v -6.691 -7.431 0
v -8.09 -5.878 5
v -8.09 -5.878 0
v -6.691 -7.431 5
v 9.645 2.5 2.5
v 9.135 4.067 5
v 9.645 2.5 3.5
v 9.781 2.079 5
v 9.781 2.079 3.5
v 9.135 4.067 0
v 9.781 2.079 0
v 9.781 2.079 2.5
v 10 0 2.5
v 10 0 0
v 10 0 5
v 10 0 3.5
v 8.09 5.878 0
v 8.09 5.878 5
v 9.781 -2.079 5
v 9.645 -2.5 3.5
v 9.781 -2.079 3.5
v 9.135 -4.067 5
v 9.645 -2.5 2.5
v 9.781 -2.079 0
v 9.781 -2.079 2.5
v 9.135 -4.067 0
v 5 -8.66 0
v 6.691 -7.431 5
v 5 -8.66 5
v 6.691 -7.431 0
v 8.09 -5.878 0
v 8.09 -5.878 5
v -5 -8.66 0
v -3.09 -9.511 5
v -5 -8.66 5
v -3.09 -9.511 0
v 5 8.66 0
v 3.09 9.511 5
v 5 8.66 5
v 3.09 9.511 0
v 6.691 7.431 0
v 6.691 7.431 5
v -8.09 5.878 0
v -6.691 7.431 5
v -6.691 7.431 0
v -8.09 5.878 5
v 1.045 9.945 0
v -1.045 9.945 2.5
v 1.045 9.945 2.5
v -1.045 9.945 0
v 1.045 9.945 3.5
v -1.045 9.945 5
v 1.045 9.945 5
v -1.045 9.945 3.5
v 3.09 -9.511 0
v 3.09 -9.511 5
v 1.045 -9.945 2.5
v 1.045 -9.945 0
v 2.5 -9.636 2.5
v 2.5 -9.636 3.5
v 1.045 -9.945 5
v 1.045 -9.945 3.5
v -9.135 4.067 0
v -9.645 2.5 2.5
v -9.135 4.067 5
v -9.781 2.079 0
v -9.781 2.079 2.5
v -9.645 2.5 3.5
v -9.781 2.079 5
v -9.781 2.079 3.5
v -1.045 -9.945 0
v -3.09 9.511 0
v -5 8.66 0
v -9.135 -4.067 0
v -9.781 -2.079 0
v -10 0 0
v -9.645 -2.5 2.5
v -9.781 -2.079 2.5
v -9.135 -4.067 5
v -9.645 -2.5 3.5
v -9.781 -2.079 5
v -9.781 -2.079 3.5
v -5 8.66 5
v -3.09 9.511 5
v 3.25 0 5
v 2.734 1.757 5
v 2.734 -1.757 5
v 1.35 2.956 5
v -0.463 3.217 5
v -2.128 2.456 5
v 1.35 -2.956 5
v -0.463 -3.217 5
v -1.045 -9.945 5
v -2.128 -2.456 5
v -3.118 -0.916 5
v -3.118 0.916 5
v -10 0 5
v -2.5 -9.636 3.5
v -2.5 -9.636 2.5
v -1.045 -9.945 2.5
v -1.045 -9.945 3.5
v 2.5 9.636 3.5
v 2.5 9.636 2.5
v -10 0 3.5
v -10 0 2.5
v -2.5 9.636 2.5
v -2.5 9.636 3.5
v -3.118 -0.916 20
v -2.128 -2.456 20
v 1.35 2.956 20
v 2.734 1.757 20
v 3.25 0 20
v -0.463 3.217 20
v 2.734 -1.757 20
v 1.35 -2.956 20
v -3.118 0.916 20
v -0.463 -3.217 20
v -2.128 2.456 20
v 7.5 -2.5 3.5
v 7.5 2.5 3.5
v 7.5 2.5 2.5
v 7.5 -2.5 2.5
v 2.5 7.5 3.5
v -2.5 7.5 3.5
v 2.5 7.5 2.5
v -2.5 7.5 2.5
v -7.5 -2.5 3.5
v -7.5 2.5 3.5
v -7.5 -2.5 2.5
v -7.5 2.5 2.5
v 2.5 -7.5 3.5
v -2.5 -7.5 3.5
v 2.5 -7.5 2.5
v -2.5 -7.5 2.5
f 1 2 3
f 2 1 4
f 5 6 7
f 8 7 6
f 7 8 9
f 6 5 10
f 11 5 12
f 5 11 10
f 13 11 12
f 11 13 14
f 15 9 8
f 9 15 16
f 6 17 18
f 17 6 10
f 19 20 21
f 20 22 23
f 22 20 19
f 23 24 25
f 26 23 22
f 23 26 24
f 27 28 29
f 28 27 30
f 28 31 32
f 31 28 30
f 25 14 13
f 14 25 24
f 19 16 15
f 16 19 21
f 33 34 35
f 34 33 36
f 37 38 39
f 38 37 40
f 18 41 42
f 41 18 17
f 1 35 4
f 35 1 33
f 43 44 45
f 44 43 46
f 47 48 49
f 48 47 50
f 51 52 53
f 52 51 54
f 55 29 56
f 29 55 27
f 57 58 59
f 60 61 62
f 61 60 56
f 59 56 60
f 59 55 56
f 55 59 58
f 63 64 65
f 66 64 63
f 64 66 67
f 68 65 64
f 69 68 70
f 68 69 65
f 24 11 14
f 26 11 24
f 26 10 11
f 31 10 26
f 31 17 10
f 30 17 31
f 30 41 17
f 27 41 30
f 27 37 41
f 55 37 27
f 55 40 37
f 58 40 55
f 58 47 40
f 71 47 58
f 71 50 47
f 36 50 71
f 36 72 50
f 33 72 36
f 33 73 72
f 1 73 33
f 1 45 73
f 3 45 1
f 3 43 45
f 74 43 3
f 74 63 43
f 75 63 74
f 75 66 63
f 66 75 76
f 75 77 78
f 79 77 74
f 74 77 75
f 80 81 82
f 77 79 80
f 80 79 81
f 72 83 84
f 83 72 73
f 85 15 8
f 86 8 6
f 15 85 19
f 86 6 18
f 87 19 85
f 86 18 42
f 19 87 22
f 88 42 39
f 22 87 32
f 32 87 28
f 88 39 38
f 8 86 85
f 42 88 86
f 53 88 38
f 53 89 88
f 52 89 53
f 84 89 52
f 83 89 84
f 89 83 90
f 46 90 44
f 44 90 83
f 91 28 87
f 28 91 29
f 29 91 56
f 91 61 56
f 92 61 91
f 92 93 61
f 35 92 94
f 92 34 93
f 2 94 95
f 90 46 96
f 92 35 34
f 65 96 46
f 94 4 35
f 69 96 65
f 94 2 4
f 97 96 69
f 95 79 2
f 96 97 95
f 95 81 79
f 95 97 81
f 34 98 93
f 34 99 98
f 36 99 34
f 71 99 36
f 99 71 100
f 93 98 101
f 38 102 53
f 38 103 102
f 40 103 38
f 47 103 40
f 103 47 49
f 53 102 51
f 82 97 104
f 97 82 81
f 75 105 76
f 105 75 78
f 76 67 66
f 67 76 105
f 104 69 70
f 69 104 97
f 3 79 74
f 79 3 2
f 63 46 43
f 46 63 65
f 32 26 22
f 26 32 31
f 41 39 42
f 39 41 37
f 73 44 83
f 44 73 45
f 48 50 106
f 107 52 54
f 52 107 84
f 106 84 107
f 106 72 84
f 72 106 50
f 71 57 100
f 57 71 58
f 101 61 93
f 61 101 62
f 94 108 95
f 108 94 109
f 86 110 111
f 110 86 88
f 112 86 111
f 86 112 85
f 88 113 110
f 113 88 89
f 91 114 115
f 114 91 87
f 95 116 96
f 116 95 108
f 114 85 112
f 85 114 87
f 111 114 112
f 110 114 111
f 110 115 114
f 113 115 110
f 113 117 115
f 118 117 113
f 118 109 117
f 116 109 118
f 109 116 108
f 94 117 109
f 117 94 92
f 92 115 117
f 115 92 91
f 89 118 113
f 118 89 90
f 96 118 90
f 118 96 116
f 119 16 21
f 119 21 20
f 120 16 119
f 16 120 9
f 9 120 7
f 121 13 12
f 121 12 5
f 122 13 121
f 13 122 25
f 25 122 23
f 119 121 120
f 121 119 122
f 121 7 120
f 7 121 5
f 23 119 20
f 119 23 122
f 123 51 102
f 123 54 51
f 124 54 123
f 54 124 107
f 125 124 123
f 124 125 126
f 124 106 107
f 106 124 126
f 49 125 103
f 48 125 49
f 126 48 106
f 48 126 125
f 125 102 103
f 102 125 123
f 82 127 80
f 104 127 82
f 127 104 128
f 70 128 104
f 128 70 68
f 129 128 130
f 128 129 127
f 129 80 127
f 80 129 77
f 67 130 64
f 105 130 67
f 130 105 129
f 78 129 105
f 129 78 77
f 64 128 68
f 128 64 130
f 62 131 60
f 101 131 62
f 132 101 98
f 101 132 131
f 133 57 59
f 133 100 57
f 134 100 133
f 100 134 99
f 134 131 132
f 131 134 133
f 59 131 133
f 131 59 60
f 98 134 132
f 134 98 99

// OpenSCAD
difference() {
    union() {
        cylinder(d=20, h=5);
        cylinder(d=6.5, h=20);
    }

    for (i = [0:3]) {
        rotate([0, 0, 90 * i])
        translate([10, 0, 3])
        cube([5, 5, 1], center=true);
    }
}
